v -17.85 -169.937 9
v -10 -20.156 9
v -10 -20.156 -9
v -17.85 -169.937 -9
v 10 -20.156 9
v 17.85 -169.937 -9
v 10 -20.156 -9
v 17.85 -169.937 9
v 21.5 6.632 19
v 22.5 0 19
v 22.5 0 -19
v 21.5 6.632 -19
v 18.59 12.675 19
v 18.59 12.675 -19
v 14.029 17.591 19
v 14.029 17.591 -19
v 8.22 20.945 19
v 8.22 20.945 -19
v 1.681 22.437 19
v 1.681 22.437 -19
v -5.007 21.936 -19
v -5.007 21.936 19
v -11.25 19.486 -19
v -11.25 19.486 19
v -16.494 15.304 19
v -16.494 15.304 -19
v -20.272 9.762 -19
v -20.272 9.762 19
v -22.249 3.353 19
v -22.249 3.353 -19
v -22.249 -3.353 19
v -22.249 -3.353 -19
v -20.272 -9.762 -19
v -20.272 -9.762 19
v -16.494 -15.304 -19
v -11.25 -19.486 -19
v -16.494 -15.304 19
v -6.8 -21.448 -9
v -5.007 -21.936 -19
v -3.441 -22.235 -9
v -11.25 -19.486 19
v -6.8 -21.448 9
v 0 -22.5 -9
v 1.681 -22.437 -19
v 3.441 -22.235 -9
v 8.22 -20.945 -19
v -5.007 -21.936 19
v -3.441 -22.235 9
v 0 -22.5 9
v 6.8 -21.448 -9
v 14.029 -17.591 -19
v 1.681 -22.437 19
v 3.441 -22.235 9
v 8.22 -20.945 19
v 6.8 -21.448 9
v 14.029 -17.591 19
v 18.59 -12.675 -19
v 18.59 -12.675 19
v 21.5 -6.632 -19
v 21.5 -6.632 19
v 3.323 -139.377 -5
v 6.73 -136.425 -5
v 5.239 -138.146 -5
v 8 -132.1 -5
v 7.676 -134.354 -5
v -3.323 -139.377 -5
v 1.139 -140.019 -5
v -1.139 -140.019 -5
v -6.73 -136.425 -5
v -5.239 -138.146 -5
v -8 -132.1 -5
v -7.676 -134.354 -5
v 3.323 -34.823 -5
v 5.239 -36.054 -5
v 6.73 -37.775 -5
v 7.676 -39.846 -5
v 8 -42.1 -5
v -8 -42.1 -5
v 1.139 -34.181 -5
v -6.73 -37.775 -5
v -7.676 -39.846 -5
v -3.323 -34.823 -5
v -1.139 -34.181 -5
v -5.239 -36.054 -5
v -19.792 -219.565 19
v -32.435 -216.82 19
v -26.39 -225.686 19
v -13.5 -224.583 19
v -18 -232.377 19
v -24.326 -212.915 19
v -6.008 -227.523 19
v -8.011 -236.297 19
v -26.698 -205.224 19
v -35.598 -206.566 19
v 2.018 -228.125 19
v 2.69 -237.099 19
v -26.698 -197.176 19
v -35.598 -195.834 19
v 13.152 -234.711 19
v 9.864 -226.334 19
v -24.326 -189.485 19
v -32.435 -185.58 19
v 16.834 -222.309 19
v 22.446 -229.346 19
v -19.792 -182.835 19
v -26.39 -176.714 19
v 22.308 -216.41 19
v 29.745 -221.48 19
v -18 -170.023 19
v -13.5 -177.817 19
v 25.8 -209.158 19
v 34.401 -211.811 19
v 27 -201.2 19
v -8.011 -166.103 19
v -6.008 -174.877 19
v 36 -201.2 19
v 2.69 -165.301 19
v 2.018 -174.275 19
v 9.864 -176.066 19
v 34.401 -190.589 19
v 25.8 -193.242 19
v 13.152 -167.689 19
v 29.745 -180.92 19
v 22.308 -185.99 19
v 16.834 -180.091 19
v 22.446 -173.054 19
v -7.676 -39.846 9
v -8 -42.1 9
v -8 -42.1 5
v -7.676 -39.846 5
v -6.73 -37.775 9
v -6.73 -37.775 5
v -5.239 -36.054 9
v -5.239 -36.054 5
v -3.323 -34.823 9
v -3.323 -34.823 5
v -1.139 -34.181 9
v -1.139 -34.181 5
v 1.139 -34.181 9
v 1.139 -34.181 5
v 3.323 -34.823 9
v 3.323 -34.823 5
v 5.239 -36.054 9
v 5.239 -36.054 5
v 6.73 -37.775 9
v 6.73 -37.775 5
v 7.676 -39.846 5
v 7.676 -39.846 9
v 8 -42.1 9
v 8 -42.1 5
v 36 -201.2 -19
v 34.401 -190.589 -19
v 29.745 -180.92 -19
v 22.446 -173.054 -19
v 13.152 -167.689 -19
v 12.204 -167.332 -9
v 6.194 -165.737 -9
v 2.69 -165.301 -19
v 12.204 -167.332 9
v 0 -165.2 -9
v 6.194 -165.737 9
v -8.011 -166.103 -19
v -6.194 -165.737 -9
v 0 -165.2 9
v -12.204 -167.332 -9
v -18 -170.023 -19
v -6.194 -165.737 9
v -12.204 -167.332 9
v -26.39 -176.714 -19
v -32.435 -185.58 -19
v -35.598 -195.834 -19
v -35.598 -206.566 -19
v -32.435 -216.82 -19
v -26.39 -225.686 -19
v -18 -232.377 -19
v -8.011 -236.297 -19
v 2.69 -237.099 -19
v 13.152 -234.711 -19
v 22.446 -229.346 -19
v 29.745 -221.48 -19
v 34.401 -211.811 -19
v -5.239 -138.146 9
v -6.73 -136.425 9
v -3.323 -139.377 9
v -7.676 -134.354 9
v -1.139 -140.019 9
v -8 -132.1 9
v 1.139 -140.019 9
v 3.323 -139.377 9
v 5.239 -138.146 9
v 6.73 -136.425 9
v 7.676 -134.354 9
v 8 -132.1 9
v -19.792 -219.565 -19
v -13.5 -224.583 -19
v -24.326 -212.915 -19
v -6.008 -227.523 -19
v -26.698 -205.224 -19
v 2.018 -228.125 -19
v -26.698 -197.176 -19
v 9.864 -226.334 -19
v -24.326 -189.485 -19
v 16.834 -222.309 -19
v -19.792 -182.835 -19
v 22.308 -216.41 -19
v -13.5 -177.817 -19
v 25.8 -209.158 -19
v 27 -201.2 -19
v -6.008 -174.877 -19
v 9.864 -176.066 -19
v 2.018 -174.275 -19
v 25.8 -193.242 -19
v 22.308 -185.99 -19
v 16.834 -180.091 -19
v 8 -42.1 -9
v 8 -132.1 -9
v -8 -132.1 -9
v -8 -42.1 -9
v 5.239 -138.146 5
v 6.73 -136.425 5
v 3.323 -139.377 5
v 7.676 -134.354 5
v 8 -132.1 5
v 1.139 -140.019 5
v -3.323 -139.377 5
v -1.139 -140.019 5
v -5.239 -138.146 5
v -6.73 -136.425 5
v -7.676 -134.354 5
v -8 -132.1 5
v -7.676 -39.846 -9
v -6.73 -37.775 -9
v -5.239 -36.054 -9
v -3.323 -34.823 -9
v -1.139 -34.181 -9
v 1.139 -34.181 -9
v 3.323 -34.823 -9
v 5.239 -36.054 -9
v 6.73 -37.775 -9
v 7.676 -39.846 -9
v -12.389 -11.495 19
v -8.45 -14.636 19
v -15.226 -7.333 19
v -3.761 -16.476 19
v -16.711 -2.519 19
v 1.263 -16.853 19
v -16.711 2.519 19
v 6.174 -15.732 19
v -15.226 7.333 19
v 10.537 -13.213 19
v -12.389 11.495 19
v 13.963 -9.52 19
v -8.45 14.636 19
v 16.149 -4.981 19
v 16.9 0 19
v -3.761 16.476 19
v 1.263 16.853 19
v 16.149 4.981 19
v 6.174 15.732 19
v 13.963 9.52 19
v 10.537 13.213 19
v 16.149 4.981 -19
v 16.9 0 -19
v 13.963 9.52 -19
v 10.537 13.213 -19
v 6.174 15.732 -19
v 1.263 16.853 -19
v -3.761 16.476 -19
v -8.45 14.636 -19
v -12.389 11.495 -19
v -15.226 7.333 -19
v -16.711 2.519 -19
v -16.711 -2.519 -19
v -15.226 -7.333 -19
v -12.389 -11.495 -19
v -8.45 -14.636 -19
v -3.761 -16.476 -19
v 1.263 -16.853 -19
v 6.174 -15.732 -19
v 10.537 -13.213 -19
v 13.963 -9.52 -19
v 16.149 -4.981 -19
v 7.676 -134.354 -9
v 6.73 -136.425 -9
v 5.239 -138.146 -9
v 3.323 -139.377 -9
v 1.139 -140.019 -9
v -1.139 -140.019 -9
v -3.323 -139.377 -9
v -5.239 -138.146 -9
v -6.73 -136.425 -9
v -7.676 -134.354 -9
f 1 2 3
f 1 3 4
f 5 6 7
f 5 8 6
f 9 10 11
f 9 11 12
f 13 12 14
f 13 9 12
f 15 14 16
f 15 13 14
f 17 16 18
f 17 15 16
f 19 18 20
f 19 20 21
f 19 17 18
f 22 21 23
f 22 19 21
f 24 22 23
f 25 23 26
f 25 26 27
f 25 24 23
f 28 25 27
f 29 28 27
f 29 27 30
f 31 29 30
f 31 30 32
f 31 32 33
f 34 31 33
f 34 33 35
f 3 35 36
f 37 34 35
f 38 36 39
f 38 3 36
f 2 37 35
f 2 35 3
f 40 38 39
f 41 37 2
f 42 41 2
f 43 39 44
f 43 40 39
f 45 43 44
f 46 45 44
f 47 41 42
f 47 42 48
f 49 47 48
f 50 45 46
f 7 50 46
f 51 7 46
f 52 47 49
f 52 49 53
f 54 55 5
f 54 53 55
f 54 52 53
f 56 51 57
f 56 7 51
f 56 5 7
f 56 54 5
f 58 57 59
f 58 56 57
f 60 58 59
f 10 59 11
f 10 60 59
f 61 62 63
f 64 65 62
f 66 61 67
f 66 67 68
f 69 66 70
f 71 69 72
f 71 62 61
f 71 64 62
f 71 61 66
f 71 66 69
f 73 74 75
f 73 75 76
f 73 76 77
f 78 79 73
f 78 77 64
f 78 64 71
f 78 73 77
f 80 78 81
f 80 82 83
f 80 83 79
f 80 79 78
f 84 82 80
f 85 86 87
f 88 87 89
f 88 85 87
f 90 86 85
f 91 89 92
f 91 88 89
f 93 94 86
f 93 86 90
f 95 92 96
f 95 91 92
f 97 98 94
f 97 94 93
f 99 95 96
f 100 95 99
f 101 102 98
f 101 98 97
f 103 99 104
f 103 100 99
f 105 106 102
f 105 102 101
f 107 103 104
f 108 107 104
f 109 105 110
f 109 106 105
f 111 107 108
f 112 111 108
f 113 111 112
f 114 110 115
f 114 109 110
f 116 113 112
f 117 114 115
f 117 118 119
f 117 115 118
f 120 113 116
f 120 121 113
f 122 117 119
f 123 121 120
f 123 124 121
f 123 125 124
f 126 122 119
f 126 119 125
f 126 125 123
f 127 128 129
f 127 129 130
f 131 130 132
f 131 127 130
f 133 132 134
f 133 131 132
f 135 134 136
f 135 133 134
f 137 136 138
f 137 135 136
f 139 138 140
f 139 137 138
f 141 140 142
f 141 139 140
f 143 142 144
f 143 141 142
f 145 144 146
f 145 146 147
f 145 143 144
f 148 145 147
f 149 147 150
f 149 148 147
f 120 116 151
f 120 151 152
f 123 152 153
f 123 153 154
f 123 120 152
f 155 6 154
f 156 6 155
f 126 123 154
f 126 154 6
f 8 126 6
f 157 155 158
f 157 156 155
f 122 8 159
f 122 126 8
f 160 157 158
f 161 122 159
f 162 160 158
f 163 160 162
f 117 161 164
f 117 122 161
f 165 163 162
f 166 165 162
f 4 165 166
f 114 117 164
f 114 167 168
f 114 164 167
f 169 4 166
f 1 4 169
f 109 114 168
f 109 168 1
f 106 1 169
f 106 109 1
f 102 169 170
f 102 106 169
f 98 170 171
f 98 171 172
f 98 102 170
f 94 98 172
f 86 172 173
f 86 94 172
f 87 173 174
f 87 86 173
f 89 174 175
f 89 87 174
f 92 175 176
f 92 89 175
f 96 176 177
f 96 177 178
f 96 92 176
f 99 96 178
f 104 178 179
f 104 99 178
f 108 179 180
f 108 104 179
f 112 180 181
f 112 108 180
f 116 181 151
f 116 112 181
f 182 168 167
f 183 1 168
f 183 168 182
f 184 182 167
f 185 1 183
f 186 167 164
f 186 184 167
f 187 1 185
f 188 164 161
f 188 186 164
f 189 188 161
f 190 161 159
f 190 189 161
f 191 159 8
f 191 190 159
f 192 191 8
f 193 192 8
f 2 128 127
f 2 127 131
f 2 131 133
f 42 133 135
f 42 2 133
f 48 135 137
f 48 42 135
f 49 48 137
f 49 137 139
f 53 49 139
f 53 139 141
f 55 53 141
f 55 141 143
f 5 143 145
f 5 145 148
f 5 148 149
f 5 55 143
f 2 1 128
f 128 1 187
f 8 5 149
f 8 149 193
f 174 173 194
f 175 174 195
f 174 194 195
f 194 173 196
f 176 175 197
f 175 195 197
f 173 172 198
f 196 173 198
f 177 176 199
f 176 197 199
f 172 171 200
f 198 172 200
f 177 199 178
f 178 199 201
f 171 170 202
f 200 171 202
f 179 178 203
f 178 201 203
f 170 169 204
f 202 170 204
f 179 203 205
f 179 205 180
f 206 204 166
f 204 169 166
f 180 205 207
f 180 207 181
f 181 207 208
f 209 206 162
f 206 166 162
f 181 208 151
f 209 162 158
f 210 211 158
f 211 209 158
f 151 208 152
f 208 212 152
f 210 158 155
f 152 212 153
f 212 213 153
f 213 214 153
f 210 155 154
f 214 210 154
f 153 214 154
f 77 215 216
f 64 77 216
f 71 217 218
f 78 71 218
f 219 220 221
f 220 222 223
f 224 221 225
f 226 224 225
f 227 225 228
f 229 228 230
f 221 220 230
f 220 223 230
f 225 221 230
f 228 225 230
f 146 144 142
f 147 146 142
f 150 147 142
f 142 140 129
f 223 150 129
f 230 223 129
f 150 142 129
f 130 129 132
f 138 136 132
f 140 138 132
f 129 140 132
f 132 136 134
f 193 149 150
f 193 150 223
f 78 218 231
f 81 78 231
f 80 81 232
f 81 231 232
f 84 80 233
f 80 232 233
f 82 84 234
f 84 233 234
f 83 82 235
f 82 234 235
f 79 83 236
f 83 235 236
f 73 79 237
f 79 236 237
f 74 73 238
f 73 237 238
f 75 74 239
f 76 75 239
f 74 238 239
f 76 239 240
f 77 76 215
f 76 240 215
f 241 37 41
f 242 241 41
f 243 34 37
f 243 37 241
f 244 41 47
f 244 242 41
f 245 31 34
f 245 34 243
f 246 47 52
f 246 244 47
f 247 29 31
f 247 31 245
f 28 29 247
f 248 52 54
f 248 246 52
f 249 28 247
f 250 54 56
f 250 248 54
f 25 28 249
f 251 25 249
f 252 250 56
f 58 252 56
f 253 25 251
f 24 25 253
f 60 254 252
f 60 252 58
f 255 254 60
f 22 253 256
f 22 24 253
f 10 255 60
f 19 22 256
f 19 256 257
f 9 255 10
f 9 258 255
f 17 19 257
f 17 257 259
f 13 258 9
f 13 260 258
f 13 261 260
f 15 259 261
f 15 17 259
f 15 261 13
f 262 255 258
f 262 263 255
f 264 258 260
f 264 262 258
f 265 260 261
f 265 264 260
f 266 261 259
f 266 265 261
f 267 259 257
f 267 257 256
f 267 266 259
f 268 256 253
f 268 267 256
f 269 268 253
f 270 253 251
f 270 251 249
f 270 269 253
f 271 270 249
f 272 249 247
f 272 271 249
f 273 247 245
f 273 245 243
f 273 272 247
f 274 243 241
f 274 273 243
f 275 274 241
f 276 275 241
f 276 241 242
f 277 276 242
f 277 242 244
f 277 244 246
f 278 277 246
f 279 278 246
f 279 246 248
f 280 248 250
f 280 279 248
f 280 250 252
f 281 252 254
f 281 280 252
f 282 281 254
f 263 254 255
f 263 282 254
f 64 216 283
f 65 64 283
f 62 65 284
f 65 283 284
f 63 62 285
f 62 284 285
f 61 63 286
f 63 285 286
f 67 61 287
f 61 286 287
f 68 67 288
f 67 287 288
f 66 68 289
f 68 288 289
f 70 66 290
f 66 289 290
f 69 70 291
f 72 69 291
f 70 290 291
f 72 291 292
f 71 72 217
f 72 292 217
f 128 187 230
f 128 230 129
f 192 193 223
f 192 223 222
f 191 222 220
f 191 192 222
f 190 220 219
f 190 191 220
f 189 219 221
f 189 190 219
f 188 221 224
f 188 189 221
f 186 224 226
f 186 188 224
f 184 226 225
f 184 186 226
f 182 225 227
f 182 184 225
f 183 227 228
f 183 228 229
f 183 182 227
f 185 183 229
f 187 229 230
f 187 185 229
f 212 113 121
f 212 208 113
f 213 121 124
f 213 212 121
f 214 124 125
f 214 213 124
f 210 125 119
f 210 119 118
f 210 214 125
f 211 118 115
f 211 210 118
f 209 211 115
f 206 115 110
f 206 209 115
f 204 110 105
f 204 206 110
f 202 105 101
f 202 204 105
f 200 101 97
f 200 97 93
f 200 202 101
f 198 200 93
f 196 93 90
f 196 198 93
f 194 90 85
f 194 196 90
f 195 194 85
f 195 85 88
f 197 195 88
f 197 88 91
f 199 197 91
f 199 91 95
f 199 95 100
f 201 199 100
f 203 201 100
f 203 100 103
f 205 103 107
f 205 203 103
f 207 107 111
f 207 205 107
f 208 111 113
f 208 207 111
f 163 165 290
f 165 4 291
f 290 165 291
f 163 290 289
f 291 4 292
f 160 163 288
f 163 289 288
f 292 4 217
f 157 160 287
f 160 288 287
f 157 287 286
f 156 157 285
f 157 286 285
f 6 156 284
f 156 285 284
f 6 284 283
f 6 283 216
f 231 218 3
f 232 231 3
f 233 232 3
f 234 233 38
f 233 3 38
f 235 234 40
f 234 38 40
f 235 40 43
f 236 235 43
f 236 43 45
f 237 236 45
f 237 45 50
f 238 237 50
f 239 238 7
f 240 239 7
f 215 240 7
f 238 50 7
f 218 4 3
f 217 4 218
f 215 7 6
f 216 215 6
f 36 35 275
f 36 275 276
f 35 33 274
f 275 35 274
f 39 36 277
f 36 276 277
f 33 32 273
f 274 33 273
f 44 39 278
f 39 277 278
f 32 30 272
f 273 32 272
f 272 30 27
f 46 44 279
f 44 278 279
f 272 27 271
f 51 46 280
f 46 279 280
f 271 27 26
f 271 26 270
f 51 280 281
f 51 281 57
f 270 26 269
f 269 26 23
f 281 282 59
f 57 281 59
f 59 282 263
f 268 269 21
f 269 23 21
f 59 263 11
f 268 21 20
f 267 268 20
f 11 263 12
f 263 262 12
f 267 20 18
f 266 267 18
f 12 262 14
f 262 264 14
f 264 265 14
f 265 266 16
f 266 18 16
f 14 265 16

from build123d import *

# Parameters (mm, degrees)
SKETCH1_R             = 22.5
SKETCH1_R_2           = 16.9
BOSS_EXTRUDE1_DEPTH   = 19
SKETCH1_R_3           = 36
SKETCH1_R_4           = 27
BOSS_EXTRUDE1_2_DEPTH = 19
BOSS_EXTRUDE2_DEPTH   = 9
CUT_EXTRUDE1_DEPTH    = 4


with BuildPart() as part:
    # Sketch1 → Boss-Extrude1 (new, symmetric)
    with BuildSketch(Plane.XY):
        Circle(SKETCH1_R)
        Circle(SKETCH1_R_2, mode=Mode.SUBTRACT)
    extrude(amount=BOSS_EXTRUDE1_DEPTH, both=True)



with BuildPart() as body_2:
    # Sketch1 → Boss-Extrude1 2 (new, symmetric)
    with BuildSketch(Plane.XY):
        with Locations((0, -201.2)):
            Circle(SKETCH1_R_3)
        with Locations((0, -201.2)):
            Circle(SKETCH1_R_4, mode=Mode.SUBTRACT)
    extrude(amount=BOSS_EXTRUDE1_2_DEPTH, both=True)


with BuildPart() as part_1:
    add(part.part)

    add(body_2.part)  # Boss-Extrude2 merges body 2
    # Sketch1<3> → Boss-Extrude2 (add, symmetric)
    with BuildSketch(Plane.XY):
        with BuildLine():
            ThreePointArc((10, -20.155644371), (0, -22.5), (-10, -20.155644371))
            Line((-10, -20.155644371), (-17.849697213, -169.936789841))
            ThreePointArc((-17.849697213, -169.936789841), (0, -165.2), (17.849697213, -169.936789841))
            Line((17.849697213, -169.936789841), (10, -20.155644371))
        make_face()
    extrude(amount=BOSS_EXTRUDE2_DEPTH, both=True)

    # Sketch2 → Cut-Extrude1 (cut)
    with BuildSketch(Plane.XY.offset(9)):
        with BuildLine():
            Line((-8, -132.1), (-8, -42.1))
            ThreePointArc((-8, -42.1), (0, -34.1), (8, -42.1))
            Line((8, -42.1), (8, -132.1))
            ThreePointArc((8, -132.1), (0, -140.1), (-8, -132.1))
        make_face()
    cut_extrude1 = extrude(amount=-CUT_EXTRUDE1_DEPTH, mode=Mode.SUBTRACT)

    # Mirror1: Cut-Extrude1 across plane
    add(cut_extrude1.mirror(Plane.XY), mode=Mode.SUBTRACT)


solid = part_1.part
